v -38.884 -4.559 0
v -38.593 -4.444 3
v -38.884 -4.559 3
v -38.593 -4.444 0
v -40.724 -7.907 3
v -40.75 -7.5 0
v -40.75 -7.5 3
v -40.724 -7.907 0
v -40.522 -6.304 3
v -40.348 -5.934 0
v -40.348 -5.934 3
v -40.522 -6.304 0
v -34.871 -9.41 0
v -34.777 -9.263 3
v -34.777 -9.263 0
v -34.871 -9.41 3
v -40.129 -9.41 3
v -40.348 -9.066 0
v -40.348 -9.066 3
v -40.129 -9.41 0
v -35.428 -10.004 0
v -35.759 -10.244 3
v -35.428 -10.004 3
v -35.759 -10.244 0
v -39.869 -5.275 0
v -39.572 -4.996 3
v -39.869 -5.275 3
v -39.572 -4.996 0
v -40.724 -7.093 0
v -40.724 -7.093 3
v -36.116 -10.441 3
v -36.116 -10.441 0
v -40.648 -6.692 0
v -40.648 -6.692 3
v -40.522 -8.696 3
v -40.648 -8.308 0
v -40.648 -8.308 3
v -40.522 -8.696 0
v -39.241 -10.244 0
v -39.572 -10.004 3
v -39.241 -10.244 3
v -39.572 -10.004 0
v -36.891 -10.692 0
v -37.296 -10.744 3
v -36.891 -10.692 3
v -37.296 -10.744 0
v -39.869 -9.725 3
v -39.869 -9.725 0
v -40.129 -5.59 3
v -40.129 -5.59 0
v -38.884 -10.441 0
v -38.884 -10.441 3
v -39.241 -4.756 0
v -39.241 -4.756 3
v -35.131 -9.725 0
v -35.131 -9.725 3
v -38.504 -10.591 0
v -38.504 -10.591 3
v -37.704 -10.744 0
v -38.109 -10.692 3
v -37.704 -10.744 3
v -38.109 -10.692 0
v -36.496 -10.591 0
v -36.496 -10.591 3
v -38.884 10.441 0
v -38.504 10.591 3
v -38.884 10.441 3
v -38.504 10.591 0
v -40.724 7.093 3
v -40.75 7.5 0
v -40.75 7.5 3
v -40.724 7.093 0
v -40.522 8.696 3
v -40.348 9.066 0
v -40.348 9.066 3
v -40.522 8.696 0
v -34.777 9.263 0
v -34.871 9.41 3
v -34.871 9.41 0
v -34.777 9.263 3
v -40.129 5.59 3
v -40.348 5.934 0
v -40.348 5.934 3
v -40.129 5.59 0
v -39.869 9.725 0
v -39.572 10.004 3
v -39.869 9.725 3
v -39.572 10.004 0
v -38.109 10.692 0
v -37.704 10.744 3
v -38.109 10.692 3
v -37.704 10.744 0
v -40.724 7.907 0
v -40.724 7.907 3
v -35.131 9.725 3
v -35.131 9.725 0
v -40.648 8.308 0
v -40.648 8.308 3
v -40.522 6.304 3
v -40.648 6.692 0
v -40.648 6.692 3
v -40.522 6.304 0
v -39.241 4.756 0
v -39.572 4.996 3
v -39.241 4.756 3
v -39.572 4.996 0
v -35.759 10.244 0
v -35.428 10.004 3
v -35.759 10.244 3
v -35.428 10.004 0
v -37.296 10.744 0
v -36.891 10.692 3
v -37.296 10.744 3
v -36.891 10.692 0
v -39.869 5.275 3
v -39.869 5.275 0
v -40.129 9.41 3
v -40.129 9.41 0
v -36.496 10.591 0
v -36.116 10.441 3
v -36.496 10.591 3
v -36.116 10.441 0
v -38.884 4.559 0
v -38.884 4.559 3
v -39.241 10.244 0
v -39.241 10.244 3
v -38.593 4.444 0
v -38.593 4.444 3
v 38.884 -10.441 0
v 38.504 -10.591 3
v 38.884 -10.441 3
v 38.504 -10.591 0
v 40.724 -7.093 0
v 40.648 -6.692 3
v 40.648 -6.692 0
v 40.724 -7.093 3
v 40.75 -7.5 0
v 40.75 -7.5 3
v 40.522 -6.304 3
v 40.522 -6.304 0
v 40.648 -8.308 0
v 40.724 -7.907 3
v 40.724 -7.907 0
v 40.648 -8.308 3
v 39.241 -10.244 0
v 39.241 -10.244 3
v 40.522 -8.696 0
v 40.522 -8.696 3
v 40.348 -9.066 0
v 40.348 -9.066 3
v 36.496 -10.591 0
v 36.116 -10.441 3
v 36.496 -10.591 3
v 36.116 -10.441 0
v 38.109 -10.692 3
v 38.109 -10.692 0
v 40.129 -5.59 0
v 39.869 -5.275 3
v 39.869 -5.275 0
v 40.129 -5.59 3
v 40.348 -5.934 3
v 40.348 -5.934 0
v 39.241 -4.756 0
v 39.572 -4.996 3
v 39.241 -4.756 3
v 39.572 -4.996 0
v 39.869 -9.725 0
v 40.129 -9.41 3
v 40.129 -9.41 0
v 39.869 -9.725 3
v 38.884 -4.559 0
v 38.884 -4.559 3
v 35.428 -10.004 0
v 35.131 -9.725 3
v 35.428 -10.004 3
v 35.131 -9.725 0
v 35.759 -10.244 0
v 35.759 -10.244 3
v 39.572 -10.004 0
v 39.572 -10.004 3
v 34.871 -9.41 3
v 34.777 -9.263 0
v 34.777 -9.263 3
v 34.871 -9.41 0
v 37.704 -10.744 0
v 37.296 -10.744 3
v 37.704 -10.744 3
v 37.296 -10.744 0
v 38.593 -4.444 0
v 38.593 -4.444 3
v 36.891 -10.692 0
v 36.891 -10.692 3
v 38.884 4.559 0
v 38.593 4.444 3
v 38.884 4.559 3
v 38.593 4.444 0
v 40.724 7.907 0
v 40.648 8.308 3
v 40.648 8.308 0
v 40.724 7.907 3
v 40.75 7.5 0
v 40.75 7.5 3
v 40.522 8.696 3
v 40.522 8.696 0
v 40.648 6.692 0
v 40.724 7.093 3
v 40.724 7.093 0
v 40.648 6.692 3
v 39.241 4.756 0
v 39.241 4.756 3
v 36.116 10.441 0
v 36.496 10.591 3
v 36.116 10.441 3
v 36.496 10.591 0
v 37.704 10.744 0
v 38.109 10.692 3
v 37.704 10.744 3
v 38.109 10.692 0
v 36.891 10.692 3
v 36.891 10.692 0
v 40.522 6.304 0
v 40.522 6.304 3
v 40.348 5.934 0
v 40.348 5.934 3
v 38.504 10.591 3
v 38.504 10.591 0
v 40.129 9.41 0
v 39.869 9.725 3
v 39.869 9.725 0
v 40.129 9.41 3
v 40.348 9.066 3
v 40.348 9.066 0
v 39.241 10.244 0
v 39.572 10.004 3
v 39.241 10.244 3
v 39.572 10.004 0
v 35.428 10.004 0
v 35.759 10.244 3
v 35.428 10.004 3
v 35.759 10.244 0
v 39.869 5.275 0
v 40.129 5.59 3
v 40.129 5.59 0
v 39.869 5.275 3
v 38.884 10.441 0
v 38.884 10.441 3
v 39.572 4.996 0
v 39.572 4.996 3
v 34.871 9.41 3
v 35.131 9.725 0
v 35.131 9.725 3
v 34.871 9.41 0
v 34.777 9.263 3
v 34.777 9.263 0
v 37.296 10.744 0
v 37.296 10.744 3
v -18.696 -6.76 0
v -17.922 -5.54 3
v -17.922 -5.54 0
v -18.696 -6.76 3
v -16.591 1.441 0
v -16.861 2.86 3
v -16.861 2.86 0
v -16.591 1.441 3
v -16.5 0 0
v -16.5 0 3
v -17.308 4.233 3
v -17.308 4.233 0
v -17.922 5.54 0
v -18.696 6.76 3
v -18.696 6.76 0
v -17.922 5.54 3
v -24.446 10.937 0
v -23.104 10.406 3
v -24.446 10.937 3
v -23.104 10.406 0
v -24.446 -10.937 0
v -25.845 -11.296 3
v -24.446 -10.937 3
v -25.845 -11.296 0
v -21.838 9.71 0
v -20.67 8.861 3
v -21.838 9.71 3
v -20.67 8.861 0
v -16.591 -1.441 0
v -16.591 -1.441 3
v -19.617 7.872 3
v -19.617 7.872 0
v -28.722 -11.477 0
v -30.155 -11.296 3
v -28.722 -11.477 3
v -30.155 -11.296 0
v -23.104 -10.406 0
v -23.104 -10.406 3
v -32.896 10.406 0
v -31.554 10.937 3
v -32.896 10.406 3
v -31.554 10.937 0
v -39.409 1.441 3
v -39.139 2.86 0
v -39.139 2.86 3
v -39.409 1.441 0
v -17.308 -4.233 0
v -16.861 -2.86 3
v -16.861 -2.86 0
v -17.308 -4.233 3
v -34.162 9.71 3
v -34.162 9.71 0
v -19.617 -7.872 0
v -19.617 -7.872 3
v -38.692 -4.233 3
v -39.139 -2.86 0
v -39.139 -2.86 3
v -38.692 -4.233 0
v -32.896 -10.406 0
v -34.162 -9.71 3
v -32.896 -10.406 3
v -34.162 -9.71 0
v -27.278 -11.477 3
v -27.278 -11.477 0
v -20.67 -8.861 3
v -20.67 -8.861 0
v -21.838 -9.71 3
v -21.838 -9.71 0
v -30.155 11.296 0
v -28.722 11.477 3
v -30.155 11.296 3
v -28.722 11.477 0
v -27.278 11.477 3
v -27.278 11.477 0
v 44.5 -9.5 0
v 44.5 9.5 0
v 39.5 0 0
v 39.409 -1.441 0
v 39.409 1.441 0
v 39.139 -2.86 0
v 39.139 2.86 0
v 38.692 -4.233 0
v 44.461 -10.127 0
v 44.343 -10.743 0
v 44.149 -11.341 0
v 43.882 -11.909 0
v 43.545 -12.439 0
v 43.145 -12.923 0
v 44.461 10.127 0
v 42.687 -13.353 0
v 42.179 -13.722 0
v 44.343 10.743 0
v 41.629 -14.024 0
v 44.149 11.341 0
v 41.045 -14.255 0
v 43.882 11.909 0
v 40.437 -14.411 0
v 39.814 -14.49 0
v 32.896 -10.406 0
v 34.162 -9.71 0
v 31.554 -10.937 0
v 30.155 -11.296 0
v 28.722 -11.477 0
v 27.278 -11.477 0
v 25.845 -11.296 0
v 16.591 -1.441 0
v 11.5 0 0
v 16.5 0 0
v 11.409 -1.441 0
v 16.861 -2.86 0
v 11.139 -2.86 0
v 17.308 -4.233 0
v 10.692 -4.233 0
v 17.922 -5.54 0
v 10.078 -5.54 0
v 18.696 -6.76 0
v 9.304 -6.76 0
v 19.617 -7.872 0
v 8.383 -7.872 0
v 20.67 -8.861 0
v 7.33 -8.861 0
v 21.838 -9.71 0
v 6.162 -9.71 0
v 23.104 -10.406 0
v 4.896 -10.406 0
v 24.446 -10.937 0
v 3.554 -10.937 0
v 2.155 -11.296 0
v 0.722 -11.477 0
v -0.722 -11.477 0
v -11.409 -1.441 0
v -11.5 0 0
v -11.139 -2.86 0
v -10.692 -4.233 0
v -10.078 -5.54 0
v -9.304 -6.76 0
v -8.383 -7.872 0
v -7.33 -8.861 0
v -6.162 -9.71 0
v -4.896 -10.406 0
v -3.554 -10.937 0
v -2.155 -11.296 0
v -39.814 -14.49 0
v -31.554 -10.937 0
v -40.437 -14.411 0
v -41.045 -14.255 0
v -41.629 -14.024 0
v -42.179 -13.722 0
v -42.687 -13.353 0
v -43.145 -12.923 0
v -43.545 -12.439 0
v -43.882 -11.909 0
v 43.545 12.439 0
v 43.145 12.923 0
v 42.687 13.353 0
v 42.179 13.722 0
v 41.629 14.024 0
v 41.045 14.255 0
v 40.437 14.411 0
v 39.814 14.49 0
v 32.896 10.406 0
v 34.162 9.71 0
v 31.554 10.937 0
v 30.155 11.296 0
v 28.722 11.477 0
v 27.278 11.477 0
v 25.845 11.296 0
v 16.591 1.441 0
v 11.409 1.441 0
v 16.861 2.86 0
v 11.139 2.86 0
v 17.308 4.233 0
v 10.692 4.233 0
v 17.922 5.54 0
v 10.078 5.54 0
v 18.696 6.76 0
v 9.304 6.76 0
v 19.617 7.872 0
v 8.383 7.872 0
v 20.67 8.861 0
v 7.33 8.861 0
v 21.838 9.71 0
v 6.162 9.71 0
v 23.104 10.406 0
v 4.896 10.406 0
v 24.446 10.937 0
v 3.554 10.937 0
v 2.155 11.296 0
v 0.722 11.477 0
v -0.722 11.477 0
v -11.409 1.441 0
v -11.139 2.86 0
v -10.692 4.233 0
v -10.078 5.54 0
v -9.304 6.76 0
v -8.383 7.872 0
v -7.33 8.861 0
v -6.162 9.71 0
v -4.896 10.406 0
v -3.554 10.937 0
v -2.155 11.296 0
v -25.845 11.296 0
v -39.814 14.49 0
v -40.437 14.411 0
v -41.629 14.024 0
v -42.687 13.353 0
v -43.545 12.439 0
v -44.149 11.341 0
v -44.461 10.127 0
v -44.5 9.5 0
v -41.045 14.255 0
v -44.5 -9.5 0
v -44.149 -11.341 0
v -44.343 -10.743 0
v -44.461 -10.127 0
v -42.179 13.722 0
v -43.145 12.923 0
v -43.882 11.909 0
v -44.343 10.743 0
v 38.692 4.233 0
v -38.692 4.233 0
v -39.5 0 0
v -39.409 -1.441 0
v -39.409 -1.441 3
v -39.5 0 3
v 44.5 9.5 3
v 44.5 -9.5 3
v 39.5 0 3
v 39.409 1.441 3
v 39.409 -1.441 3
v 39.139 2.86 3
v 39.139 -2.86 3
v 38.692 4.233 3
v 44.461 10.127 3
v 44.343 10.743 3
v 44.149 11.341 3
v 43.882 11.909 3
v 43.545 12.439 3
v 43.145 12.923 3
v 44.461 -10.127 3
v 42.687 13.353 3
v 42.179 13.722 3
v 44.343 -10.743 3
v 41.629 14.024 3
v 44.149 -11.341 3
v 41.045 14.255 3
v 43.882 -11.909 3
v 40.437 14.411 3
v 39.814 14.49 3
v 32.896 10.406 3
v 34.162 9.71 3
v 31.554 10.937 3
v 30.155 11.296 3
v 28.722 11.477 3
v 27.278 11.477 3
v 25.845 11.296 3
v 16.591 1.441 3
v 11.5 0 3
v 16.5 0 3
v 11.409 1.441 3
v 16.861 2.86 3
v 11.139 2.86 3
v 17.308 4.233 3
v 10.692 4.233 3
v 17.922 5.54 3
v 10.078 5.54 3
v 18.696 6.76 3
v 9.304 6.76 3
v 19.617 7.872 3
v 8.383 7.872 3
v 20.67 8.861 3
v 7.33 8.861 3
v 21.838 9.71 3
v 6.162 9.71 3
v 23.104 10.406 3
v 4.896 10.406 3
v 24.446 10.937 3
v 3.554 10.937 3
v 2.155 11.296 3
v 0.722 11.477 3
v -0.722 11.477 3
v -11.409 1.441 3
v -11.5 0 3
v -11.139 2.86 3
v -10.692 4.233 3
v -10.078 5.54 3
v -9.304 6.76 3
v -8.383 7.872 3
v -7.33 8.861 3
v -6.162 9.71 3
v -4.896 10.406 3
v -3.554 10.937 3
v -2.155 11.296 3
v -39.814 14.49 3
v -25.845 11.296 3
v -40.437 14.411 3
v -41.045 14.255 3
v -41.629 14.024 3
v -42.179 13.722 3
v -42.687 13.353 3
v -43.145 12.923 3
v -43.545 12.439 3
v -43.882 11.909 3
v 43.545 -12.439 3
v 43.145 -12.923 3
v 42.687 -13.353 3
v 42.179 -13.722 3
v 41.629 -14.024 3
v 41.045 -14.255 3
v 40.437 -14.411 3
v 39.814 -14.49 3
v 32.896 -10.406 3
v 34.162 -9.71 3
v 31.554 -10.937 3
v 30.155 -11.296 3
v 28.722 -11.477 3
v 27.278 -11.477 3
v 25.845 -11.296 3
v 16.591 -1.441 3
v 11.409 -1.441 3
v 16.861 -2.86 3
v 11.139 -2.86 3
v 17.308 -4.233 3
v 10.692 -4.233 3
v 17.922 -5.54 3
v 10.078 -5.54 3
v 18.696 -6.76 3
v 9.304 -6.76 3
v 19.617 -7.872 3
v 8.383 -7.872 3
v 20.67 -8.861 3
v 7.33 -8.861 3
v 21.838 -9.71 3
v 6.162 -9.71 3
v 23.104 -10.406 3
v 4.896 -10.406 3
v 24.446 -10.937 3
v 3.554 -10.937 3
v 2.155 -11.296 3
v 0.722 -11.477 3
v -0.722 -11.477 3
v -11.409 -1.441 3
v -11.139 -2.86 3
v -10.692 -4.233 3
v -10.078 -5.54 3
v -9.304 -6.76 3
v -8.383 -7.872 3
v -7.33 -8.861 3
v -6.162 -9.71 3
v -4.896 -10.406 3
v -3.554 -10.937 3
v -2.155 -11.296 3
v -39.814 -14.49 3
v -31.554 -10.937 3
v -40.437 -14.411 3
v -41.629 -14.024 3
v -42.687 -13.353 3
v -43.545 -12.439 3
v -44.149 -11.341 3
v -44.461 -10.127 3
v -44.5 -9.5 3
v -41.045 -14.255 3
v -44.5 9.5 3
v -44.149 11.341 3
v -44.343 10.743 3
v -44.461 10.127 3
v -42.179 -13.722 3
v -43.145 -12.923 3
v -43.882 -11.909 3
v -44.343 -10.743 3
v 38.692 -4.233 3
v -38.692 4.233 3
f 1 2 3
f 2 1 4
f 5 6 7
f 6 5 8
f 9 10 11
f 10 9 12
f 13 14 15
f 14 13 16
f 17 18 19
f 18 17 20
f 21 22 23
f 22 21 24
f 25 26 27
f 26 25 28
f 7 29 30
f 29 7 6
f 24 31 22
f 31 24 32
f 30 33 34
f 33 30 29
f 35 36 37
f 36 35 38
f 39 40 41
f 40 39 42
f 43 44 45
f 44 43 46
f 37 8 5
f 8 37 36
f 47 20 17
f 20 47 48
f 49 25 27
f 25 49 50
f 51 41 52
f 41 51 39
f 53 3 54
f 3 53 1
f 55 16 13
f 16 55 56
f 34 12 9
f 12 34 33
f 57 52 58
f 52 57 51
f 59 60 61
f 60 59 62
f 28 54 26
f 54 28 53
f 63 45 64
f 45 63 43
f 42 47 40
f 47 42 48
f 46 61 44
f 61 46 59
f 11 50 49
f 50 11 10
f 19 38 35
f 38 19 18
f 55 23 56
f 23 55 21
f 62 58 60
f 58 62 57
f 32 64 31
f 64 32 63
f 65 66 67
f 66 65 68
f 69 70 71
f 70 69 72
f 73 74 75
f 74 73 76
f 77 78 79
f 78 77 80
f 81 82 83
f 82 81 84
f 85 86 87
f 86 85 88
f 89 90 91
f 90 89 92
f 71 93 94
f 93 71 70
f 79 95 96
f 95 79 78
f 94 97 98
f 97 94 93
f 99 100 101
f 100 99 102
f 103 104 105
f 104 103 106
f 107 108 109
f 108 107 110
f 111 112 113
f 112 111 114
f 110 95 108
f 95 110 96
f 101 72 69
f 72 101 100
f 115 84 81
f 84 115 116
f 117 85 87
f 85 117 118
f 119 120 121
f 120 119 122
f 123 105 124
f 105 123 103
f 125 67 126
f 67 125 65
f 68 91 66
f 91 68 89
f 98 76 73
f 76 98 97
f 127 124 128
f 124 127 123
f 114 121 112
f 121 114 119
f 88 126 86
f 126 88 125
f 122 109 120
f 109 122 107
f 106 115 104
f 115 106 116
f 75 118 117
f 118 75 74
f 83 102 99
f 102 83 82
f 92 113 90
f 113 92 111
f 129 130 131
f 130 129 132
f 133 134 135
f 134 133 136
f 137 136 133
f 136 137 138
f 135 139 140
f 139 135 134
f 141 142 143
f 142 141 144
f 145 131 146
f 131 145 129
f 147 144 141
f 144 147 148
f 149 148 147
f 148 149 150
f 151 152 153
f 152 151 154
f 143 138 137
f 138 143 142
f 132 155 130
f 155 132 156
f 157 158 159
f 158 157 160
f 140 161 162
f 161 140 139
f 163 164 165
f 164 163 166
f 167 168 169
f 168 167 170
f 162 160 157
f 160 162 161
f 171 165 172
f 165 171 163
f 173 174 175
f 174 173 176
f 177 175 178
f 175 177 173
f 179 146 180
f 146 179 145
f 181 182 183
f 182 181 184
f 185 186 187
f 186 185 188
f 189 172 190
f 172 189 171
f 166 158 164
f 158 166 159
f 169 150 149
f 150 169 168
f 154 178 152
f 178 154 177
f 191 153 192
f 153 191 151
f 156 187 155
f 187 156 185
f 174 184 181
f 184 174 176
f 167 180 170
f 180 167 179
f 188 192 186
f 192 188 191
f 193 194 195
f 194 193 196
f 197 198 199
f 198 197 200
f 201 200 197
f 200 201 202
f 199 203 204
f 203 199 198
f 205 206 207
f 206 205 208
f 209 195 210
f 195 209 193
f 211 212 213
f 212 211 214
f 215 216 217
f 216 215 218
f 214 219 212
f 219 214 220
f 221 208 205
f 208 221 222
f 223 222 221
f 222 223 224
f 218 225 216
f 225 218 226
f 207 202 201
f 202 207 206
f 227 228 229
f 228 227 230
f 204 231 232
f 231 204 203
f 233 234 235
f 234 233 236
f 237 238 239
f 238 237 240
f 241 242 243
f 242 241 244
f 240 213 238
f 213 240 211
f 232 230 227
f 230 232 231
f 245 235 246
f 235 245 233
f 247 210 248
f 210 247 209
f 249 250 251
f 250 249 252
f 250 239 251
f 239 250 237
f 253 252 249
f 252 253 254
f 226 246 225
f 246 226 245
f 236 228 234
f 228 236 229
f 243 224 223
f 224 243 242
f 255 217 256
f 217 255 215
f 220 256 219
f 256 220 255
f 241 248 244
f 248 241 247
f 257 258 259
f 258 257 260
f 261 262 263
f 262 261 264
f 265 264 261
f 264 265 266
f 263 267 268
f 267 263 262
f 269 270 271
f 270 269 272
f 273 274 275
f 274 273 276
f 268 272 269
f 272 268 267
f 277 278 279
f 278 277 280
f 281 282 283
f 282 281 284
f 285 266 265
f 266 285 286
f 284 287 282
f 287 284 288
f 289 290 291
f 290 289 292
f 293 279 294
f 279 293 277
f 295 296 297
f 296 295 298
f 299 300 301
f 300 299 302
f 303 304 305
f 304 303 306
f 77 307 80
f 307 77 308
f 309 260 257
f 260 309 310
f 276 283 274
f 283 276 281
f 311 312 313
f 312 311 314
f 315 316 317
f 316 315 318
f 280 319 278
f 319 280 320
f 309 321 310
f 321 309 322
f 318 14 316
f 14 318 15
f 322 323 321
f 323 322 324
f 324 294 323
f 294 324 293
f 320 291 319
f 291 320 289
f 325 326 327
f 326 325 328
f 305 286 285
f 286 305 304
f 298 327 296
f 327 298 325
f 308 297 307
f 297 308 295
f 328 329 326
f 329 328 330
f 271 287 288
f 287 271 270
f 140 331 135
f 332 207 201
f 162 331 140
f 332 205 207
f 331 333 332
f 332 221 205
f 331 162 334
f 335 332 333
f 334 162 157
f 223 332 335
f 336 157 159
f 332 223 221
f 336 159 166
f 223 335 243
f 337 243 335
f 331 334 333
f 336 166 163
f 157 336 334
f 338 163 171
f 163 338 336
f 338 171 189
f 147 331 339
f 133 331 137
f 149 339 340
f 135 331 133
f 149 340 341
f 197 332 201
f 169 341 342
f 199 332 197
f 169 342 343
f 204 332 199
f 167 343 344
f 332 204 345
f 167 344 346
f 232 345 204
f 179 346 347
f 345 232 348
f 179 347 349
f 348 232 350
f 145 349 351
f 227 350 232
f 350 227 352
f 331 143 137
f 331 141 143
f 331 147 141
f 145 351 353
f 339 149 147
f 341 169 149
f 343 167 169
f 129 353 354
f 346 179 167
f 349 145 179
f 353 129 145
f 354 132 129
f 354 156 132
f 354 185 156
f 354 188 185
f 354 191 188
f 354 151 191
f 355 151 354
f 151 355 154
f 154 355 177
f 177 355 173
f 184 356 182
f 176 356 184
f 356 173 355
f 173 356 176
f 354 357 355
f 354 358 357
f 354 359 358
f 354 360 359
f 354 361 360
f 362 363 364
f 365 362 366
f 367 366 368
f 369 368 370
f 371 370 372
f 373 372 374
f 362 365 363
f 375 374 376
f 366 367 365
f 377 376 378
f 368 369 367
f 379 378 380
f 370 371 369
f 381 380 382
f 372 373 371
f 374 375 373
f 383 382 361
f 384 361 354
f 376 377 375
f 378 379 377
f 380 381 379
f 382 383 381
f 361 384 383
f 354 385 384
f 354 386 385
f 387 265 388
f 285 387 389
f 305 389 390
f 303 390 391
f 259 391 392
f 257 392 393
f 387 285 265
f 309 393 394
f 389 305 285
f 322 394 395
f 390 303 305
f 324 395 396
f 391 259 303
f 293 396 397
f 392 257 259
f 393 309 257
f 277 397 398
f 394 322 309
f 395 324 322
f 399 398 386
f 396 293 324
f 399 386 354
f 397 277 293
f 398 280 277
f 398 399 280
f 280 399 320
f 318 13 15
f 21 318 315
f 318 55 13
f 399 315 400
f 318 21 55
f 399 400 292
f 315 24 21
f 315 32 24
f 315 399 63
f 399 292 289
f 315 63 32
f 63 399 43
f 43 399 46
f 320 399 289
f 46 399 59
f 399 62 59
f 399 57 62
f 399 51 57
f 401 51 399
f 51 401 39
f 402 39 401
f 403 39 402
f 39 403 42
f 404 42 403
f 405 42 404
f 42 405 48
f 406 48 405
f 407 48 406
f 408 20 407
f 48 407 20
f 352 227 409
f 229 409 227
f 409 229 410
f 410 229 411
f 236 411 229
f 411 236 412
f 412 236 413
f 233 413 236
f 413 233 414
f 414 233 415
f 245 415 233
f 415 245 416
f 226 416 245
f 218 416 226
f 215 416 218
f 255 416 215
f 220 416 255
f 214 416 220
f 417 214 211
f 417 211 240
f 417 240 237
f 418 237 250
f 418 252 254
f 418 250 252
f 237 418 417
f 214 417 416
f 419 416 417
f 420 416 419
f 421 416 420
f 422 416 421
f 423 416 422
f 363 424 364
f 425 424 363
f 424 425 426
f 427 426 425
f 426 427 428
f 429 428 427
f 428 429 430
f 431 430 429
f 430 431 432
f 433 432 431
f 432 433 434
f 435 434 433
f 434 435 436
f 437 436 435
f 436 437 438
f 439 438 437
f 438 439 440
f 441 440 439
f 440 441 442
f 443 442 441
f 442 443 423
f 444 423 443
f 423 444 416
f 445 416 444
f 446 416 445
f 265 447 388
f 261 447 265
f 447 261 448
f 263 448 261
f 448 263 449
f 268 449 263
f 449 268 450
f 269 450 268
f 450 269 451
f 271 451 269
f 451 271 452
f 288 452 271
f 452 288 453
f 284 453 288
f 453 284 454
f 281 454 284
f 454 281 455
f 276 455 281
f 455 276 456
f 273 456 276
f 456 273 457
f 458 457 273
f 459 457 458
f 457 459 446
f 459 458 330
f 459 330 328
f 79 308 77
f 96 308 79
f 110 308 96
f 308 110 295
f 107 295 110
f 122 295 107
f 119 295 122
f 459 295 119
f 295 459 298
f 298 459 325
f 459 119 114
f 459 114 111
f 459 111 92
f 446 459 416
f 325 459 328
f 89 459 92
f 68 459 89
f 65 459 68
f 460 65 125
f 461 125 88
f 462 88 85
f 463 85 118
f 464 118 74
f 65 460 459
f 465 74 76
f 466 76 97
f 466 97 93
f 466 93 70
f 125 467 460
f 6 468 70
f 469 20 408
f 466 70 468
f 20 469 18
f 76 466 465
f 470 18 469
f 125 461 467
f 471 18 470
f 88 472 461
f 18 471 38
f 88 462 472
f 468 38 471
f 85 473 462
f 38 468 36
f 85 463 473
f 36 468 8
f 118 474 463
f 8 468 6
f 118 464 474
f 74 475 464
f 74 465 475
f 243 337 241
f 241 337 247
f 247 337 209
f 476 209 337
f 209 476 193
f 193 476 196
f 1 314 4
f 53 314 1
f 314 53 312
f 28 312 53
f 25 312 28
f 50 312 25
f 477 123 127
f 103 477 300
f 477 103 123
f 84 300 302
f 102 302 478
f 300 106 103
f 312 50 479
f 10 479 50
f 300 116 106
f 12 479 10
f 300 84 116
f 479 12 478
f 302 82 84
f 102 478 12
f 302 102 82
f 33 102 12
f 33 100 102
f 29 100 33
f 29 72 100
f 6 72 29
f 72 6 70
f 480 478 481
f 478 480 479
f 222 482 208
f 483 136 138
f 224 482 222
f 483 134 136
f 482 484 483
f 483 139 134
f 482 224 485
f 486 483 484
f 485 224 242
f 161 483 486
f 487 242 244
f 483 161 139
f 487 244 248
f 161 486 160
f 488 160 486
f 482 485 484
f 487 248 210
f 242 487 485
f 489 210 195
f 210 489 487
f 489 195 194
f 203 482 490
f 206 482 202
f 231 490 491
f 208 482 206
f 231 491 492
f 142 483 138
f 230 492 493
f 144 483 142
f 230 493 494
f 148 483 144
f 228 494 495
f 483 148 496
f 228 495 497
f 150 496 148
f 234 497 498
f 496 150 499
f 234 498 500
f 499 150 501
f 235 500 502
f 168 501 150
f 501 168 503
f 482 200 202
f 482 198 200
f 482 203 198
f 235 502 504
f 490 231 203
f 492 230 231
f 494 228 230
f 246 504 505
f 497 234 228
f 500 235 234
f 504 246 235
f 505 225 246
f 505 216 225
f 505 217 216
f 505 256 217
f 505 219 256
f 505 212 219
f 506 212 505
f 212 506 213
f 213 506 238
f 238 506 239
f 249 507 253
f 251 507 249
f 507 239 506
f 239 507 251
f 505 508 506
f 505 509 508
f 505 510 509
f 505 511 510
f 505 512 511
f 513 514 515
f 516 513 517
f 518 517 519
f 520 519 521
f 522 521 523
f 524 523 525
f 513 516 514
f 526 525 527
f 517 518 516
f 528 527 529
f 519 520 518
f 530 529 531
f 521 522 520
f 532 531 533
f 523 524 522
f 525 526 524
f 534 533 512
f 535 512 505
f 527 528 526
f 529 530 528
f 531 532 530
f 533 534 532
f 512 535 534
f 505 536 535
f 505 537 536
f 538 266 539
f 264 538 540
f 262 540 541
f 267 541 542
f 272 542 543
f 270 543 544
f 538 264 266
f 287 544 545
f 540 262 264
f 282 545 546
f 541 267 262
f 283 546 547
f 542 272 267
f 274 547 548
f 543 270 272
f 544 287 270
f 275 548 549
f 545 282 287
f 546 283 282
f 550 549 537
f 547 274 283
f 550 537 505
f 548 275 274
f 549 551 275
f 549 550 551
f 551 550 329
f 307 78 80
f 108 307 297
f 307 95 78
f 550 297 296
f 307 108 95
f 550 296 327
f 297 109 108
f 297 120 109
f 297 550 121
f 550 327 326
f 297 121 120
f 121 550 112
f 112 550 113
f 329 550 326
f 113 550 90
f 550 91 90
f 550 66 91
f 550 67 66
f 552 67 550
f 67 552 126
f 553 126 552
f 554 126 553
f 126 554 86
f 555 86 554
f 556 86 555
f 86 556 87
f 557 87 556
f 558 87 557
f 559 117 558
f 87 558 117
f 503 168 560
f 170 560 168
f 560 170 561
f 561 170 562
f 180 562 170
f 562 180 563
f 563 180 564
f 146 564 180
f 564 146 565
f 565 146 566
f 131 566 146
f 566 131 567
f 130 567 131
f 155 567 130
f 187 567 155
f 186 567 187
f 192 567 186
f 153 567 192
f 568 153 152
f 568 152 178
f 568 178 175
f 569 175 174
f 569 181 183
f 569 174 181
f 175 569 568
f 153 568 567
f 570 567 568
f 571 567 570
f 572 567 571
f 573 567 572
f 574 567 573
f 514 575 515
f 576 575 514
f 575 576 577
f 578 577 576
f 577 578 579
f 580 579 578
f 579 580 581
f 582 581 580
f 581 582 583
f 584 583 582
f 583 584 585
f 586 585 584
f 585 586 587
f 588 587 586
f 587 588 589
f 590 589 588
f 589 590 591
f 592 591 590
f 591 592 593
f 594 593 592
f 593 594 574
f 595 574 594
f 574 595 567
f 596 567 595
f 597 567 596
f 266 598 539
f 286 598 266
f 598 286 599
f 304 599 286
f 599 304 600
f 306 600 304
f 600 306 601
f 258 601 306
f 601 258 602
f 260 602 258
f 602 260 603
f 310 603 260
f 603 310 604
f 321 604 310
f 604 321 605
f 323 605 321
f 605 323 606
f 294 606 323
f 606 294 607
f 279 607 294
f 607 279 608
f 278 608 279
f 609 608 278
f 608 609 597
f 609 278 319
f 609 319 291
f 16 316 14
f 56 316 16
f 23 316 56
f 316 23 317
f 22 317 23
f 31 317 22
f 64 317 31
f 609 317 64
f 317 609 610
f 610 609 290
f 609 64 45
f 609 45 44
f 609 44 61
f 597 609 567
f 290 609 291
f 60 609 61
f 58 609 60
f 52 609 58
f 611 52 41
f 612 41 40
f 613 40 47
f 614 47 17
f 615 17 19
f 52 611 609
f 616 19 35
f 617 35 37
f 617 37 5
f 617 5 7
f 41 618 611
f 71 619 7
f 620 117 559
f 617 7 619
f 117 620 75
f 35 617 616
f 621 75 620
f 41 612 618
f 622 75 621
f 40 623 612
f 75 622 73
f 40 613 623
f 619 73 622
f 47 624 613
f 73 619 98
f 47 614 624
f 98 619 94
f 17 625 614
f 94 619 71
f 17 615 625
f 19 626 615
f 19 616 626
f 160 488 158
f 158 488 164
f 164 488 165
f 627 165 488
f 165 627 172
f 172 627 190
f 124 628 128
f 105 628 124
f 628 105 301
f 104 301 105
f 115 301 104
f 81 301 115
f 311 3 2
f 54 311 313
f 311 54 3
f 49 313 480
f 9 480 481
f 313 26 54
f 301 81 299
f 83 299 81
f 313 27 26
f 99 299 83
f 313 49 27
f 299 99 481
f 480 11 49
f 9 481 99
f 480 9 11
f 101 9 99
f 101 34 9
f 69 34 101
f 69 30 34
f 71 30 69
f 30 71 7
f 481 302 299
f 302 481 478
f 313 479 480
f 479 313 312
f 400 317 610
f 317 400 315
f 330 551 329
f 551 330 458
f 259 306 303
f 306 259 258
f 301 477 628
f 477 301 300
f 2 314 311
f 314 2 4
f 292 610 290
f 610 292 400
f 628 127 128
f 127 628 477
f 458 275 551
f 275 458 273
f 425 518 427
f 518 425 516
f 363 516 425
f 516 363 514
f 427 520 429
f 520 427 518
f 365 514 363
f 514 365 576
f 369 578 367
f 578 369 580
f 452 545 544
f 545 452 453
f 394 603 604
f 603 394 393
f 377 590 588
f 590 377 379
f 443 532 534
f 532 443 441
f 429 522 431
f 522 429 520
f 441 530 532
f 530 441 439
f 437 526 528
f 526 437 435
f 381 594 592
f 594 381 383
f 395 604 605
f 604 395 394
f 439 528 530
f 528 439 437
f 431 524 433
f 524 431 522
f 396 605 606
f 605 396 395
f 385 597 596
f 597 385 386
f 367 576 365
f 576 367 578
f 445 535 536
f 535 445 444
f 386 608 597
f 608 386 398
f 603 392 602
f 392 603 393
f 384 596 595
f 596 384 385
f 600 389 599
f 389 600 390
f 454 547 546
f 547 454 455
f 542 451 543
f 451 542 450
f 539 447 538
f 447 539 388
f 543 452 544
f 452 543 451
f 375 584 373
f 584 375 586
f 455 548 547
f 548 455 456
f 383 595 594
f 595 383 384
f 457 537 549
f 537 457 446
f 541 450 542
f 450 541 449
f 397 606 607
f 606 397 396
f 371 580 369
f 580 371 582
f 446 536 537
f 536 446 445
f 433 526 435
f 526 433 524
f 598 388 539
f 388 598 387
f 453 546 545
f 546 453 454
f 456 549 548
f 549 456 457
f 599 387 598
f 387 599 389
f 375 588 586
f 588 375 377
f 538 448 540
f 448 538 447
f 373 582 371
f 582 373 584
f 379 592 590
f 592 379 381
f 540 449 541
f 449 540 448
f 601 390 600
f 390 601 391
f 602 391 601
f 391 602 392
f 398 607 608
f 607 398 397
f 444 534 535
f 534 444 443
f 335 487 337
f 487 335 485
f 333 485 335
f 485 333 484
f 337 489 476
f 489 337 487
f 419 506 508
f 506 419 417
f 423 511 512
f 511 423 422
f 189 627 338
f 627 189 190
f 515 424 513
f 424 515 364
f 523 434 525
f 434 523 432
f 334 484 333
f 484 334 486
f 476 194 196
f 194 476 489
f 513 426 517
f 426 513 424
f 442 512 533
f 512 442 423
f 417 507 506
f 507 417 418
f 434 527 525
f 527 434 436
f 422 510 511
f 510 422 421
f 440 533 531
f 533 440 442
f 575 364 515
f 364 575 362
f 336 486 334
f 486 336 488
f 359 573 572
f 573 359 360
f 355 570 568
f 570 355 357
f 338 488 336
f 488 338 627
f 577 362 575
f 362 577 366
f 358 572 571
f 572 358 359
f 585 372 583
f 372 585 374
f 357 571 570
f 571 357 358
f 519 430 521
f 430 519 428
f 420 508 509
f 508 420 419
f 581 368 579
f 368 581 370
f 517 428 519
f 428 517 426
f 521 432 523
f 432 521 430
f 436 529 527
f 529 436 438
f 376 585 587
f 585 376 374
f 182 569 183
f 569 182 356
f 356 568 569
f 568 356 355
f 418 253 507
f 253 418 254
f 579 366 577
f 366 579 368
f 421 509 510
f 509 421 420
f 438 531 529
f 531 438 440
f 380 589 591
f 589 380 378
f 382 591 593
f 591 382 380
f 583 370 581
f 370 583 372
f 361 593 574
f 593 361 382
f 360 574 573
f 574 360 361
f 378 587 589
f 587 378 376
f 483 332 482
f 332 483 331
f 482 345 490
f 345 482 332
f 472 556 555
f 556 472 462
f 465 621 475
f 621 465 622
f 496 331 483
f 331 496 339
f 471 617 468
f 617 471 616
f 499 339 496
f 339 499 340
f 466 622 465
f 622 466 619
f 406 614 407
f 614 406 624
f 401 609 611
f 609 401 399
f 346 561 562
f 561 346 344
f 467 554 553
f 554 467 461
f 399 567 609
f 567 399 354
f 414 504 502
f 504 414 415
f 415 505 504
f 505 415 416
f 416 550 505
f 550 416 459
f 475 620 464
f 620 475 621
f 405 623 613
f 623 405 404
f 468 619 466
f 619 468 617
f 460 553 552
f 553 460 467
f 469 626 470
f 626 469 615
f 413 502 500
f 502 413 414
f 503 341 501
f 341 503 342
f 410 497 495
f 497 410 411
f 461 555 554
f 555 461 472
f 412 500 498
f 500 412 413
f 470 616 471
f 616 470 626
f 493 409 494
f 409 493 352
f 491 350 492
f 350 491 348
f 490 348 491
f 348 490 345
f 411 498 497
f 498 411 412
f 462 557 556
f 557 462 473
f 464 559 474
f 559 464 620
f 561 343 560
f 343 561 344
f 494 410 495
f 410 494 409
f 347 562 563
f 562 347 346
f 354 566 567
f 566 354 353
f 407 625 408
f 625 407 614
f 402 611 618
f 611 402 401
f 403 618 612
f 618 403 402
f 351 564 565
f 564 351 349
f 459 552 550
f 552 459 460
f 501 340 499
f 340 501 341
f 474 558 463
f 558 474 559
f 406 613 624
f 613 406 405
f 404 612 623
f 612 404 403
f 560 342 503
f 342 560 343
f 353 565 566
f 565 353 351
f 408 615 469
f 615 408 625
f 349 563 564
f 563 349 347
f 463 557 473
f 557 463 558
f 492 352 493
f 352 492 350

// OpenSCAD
$fn = 50;

difference() {
	union() {
		hull() {
			translate(v = [-39.5, 9.5, 0]) {
				cylinder(h = 3, r = 5);
			}
			translate(v = [39.5, 9.5, 0]) {
				cylinder(h = 3, r = 5);
			}
			translate(v = [-39.5, -9.5, 0]) {
				cylinder(h = 3, r = 5);
			}
			translate(v = [39.5, -9.5, 0]) {
				cylinder(h = 3, r = 5);
			}
		}
	}
	union() {
		translate(v = [-37.5, -7.5, -100.0]) {
			cylinder(h = 200, r = 3.25);
		}
		translate(v = [-37.5, 7.5, -100.0]) {
			cylinder(h = 200, r = 3.25);
		}
		translate(v = [37.5, -7.5, -100.0]) {
			cylinder(h = 200, r = 3.25);
		}
		translate(v = [37.5, 7.5, -100.0]) {
			cylinder(h = 200, r = 3.25);
		}
		translate(v = [-37.5, -7.5, -100.0]) {
			cylinder(h = 200, r = 1.8);
		}
		translate(v = [-37.5, 7.5, -100.0]) {
			cylinder(h = 200, r = 1.8);
		}
		translate(v = [37.5, -7.5, -100.0]) {
			cylinder(h = 200, r = 1.8);
		}
		translate(v = [37.5, 7.5, -100.0]) {
			cylinder(h = 200, r = 1.8);
		}
		translate(v = [-28.0, 0, 0.0]) {
			cylinder(h = 3, r = 11.5);
		}
		cylinder(h = 3, r = 11.5);
		translate(v = [28.0, 0, 0.0]) {
			cylinder(h = 3, r = 11.5);
		}
	}
}
